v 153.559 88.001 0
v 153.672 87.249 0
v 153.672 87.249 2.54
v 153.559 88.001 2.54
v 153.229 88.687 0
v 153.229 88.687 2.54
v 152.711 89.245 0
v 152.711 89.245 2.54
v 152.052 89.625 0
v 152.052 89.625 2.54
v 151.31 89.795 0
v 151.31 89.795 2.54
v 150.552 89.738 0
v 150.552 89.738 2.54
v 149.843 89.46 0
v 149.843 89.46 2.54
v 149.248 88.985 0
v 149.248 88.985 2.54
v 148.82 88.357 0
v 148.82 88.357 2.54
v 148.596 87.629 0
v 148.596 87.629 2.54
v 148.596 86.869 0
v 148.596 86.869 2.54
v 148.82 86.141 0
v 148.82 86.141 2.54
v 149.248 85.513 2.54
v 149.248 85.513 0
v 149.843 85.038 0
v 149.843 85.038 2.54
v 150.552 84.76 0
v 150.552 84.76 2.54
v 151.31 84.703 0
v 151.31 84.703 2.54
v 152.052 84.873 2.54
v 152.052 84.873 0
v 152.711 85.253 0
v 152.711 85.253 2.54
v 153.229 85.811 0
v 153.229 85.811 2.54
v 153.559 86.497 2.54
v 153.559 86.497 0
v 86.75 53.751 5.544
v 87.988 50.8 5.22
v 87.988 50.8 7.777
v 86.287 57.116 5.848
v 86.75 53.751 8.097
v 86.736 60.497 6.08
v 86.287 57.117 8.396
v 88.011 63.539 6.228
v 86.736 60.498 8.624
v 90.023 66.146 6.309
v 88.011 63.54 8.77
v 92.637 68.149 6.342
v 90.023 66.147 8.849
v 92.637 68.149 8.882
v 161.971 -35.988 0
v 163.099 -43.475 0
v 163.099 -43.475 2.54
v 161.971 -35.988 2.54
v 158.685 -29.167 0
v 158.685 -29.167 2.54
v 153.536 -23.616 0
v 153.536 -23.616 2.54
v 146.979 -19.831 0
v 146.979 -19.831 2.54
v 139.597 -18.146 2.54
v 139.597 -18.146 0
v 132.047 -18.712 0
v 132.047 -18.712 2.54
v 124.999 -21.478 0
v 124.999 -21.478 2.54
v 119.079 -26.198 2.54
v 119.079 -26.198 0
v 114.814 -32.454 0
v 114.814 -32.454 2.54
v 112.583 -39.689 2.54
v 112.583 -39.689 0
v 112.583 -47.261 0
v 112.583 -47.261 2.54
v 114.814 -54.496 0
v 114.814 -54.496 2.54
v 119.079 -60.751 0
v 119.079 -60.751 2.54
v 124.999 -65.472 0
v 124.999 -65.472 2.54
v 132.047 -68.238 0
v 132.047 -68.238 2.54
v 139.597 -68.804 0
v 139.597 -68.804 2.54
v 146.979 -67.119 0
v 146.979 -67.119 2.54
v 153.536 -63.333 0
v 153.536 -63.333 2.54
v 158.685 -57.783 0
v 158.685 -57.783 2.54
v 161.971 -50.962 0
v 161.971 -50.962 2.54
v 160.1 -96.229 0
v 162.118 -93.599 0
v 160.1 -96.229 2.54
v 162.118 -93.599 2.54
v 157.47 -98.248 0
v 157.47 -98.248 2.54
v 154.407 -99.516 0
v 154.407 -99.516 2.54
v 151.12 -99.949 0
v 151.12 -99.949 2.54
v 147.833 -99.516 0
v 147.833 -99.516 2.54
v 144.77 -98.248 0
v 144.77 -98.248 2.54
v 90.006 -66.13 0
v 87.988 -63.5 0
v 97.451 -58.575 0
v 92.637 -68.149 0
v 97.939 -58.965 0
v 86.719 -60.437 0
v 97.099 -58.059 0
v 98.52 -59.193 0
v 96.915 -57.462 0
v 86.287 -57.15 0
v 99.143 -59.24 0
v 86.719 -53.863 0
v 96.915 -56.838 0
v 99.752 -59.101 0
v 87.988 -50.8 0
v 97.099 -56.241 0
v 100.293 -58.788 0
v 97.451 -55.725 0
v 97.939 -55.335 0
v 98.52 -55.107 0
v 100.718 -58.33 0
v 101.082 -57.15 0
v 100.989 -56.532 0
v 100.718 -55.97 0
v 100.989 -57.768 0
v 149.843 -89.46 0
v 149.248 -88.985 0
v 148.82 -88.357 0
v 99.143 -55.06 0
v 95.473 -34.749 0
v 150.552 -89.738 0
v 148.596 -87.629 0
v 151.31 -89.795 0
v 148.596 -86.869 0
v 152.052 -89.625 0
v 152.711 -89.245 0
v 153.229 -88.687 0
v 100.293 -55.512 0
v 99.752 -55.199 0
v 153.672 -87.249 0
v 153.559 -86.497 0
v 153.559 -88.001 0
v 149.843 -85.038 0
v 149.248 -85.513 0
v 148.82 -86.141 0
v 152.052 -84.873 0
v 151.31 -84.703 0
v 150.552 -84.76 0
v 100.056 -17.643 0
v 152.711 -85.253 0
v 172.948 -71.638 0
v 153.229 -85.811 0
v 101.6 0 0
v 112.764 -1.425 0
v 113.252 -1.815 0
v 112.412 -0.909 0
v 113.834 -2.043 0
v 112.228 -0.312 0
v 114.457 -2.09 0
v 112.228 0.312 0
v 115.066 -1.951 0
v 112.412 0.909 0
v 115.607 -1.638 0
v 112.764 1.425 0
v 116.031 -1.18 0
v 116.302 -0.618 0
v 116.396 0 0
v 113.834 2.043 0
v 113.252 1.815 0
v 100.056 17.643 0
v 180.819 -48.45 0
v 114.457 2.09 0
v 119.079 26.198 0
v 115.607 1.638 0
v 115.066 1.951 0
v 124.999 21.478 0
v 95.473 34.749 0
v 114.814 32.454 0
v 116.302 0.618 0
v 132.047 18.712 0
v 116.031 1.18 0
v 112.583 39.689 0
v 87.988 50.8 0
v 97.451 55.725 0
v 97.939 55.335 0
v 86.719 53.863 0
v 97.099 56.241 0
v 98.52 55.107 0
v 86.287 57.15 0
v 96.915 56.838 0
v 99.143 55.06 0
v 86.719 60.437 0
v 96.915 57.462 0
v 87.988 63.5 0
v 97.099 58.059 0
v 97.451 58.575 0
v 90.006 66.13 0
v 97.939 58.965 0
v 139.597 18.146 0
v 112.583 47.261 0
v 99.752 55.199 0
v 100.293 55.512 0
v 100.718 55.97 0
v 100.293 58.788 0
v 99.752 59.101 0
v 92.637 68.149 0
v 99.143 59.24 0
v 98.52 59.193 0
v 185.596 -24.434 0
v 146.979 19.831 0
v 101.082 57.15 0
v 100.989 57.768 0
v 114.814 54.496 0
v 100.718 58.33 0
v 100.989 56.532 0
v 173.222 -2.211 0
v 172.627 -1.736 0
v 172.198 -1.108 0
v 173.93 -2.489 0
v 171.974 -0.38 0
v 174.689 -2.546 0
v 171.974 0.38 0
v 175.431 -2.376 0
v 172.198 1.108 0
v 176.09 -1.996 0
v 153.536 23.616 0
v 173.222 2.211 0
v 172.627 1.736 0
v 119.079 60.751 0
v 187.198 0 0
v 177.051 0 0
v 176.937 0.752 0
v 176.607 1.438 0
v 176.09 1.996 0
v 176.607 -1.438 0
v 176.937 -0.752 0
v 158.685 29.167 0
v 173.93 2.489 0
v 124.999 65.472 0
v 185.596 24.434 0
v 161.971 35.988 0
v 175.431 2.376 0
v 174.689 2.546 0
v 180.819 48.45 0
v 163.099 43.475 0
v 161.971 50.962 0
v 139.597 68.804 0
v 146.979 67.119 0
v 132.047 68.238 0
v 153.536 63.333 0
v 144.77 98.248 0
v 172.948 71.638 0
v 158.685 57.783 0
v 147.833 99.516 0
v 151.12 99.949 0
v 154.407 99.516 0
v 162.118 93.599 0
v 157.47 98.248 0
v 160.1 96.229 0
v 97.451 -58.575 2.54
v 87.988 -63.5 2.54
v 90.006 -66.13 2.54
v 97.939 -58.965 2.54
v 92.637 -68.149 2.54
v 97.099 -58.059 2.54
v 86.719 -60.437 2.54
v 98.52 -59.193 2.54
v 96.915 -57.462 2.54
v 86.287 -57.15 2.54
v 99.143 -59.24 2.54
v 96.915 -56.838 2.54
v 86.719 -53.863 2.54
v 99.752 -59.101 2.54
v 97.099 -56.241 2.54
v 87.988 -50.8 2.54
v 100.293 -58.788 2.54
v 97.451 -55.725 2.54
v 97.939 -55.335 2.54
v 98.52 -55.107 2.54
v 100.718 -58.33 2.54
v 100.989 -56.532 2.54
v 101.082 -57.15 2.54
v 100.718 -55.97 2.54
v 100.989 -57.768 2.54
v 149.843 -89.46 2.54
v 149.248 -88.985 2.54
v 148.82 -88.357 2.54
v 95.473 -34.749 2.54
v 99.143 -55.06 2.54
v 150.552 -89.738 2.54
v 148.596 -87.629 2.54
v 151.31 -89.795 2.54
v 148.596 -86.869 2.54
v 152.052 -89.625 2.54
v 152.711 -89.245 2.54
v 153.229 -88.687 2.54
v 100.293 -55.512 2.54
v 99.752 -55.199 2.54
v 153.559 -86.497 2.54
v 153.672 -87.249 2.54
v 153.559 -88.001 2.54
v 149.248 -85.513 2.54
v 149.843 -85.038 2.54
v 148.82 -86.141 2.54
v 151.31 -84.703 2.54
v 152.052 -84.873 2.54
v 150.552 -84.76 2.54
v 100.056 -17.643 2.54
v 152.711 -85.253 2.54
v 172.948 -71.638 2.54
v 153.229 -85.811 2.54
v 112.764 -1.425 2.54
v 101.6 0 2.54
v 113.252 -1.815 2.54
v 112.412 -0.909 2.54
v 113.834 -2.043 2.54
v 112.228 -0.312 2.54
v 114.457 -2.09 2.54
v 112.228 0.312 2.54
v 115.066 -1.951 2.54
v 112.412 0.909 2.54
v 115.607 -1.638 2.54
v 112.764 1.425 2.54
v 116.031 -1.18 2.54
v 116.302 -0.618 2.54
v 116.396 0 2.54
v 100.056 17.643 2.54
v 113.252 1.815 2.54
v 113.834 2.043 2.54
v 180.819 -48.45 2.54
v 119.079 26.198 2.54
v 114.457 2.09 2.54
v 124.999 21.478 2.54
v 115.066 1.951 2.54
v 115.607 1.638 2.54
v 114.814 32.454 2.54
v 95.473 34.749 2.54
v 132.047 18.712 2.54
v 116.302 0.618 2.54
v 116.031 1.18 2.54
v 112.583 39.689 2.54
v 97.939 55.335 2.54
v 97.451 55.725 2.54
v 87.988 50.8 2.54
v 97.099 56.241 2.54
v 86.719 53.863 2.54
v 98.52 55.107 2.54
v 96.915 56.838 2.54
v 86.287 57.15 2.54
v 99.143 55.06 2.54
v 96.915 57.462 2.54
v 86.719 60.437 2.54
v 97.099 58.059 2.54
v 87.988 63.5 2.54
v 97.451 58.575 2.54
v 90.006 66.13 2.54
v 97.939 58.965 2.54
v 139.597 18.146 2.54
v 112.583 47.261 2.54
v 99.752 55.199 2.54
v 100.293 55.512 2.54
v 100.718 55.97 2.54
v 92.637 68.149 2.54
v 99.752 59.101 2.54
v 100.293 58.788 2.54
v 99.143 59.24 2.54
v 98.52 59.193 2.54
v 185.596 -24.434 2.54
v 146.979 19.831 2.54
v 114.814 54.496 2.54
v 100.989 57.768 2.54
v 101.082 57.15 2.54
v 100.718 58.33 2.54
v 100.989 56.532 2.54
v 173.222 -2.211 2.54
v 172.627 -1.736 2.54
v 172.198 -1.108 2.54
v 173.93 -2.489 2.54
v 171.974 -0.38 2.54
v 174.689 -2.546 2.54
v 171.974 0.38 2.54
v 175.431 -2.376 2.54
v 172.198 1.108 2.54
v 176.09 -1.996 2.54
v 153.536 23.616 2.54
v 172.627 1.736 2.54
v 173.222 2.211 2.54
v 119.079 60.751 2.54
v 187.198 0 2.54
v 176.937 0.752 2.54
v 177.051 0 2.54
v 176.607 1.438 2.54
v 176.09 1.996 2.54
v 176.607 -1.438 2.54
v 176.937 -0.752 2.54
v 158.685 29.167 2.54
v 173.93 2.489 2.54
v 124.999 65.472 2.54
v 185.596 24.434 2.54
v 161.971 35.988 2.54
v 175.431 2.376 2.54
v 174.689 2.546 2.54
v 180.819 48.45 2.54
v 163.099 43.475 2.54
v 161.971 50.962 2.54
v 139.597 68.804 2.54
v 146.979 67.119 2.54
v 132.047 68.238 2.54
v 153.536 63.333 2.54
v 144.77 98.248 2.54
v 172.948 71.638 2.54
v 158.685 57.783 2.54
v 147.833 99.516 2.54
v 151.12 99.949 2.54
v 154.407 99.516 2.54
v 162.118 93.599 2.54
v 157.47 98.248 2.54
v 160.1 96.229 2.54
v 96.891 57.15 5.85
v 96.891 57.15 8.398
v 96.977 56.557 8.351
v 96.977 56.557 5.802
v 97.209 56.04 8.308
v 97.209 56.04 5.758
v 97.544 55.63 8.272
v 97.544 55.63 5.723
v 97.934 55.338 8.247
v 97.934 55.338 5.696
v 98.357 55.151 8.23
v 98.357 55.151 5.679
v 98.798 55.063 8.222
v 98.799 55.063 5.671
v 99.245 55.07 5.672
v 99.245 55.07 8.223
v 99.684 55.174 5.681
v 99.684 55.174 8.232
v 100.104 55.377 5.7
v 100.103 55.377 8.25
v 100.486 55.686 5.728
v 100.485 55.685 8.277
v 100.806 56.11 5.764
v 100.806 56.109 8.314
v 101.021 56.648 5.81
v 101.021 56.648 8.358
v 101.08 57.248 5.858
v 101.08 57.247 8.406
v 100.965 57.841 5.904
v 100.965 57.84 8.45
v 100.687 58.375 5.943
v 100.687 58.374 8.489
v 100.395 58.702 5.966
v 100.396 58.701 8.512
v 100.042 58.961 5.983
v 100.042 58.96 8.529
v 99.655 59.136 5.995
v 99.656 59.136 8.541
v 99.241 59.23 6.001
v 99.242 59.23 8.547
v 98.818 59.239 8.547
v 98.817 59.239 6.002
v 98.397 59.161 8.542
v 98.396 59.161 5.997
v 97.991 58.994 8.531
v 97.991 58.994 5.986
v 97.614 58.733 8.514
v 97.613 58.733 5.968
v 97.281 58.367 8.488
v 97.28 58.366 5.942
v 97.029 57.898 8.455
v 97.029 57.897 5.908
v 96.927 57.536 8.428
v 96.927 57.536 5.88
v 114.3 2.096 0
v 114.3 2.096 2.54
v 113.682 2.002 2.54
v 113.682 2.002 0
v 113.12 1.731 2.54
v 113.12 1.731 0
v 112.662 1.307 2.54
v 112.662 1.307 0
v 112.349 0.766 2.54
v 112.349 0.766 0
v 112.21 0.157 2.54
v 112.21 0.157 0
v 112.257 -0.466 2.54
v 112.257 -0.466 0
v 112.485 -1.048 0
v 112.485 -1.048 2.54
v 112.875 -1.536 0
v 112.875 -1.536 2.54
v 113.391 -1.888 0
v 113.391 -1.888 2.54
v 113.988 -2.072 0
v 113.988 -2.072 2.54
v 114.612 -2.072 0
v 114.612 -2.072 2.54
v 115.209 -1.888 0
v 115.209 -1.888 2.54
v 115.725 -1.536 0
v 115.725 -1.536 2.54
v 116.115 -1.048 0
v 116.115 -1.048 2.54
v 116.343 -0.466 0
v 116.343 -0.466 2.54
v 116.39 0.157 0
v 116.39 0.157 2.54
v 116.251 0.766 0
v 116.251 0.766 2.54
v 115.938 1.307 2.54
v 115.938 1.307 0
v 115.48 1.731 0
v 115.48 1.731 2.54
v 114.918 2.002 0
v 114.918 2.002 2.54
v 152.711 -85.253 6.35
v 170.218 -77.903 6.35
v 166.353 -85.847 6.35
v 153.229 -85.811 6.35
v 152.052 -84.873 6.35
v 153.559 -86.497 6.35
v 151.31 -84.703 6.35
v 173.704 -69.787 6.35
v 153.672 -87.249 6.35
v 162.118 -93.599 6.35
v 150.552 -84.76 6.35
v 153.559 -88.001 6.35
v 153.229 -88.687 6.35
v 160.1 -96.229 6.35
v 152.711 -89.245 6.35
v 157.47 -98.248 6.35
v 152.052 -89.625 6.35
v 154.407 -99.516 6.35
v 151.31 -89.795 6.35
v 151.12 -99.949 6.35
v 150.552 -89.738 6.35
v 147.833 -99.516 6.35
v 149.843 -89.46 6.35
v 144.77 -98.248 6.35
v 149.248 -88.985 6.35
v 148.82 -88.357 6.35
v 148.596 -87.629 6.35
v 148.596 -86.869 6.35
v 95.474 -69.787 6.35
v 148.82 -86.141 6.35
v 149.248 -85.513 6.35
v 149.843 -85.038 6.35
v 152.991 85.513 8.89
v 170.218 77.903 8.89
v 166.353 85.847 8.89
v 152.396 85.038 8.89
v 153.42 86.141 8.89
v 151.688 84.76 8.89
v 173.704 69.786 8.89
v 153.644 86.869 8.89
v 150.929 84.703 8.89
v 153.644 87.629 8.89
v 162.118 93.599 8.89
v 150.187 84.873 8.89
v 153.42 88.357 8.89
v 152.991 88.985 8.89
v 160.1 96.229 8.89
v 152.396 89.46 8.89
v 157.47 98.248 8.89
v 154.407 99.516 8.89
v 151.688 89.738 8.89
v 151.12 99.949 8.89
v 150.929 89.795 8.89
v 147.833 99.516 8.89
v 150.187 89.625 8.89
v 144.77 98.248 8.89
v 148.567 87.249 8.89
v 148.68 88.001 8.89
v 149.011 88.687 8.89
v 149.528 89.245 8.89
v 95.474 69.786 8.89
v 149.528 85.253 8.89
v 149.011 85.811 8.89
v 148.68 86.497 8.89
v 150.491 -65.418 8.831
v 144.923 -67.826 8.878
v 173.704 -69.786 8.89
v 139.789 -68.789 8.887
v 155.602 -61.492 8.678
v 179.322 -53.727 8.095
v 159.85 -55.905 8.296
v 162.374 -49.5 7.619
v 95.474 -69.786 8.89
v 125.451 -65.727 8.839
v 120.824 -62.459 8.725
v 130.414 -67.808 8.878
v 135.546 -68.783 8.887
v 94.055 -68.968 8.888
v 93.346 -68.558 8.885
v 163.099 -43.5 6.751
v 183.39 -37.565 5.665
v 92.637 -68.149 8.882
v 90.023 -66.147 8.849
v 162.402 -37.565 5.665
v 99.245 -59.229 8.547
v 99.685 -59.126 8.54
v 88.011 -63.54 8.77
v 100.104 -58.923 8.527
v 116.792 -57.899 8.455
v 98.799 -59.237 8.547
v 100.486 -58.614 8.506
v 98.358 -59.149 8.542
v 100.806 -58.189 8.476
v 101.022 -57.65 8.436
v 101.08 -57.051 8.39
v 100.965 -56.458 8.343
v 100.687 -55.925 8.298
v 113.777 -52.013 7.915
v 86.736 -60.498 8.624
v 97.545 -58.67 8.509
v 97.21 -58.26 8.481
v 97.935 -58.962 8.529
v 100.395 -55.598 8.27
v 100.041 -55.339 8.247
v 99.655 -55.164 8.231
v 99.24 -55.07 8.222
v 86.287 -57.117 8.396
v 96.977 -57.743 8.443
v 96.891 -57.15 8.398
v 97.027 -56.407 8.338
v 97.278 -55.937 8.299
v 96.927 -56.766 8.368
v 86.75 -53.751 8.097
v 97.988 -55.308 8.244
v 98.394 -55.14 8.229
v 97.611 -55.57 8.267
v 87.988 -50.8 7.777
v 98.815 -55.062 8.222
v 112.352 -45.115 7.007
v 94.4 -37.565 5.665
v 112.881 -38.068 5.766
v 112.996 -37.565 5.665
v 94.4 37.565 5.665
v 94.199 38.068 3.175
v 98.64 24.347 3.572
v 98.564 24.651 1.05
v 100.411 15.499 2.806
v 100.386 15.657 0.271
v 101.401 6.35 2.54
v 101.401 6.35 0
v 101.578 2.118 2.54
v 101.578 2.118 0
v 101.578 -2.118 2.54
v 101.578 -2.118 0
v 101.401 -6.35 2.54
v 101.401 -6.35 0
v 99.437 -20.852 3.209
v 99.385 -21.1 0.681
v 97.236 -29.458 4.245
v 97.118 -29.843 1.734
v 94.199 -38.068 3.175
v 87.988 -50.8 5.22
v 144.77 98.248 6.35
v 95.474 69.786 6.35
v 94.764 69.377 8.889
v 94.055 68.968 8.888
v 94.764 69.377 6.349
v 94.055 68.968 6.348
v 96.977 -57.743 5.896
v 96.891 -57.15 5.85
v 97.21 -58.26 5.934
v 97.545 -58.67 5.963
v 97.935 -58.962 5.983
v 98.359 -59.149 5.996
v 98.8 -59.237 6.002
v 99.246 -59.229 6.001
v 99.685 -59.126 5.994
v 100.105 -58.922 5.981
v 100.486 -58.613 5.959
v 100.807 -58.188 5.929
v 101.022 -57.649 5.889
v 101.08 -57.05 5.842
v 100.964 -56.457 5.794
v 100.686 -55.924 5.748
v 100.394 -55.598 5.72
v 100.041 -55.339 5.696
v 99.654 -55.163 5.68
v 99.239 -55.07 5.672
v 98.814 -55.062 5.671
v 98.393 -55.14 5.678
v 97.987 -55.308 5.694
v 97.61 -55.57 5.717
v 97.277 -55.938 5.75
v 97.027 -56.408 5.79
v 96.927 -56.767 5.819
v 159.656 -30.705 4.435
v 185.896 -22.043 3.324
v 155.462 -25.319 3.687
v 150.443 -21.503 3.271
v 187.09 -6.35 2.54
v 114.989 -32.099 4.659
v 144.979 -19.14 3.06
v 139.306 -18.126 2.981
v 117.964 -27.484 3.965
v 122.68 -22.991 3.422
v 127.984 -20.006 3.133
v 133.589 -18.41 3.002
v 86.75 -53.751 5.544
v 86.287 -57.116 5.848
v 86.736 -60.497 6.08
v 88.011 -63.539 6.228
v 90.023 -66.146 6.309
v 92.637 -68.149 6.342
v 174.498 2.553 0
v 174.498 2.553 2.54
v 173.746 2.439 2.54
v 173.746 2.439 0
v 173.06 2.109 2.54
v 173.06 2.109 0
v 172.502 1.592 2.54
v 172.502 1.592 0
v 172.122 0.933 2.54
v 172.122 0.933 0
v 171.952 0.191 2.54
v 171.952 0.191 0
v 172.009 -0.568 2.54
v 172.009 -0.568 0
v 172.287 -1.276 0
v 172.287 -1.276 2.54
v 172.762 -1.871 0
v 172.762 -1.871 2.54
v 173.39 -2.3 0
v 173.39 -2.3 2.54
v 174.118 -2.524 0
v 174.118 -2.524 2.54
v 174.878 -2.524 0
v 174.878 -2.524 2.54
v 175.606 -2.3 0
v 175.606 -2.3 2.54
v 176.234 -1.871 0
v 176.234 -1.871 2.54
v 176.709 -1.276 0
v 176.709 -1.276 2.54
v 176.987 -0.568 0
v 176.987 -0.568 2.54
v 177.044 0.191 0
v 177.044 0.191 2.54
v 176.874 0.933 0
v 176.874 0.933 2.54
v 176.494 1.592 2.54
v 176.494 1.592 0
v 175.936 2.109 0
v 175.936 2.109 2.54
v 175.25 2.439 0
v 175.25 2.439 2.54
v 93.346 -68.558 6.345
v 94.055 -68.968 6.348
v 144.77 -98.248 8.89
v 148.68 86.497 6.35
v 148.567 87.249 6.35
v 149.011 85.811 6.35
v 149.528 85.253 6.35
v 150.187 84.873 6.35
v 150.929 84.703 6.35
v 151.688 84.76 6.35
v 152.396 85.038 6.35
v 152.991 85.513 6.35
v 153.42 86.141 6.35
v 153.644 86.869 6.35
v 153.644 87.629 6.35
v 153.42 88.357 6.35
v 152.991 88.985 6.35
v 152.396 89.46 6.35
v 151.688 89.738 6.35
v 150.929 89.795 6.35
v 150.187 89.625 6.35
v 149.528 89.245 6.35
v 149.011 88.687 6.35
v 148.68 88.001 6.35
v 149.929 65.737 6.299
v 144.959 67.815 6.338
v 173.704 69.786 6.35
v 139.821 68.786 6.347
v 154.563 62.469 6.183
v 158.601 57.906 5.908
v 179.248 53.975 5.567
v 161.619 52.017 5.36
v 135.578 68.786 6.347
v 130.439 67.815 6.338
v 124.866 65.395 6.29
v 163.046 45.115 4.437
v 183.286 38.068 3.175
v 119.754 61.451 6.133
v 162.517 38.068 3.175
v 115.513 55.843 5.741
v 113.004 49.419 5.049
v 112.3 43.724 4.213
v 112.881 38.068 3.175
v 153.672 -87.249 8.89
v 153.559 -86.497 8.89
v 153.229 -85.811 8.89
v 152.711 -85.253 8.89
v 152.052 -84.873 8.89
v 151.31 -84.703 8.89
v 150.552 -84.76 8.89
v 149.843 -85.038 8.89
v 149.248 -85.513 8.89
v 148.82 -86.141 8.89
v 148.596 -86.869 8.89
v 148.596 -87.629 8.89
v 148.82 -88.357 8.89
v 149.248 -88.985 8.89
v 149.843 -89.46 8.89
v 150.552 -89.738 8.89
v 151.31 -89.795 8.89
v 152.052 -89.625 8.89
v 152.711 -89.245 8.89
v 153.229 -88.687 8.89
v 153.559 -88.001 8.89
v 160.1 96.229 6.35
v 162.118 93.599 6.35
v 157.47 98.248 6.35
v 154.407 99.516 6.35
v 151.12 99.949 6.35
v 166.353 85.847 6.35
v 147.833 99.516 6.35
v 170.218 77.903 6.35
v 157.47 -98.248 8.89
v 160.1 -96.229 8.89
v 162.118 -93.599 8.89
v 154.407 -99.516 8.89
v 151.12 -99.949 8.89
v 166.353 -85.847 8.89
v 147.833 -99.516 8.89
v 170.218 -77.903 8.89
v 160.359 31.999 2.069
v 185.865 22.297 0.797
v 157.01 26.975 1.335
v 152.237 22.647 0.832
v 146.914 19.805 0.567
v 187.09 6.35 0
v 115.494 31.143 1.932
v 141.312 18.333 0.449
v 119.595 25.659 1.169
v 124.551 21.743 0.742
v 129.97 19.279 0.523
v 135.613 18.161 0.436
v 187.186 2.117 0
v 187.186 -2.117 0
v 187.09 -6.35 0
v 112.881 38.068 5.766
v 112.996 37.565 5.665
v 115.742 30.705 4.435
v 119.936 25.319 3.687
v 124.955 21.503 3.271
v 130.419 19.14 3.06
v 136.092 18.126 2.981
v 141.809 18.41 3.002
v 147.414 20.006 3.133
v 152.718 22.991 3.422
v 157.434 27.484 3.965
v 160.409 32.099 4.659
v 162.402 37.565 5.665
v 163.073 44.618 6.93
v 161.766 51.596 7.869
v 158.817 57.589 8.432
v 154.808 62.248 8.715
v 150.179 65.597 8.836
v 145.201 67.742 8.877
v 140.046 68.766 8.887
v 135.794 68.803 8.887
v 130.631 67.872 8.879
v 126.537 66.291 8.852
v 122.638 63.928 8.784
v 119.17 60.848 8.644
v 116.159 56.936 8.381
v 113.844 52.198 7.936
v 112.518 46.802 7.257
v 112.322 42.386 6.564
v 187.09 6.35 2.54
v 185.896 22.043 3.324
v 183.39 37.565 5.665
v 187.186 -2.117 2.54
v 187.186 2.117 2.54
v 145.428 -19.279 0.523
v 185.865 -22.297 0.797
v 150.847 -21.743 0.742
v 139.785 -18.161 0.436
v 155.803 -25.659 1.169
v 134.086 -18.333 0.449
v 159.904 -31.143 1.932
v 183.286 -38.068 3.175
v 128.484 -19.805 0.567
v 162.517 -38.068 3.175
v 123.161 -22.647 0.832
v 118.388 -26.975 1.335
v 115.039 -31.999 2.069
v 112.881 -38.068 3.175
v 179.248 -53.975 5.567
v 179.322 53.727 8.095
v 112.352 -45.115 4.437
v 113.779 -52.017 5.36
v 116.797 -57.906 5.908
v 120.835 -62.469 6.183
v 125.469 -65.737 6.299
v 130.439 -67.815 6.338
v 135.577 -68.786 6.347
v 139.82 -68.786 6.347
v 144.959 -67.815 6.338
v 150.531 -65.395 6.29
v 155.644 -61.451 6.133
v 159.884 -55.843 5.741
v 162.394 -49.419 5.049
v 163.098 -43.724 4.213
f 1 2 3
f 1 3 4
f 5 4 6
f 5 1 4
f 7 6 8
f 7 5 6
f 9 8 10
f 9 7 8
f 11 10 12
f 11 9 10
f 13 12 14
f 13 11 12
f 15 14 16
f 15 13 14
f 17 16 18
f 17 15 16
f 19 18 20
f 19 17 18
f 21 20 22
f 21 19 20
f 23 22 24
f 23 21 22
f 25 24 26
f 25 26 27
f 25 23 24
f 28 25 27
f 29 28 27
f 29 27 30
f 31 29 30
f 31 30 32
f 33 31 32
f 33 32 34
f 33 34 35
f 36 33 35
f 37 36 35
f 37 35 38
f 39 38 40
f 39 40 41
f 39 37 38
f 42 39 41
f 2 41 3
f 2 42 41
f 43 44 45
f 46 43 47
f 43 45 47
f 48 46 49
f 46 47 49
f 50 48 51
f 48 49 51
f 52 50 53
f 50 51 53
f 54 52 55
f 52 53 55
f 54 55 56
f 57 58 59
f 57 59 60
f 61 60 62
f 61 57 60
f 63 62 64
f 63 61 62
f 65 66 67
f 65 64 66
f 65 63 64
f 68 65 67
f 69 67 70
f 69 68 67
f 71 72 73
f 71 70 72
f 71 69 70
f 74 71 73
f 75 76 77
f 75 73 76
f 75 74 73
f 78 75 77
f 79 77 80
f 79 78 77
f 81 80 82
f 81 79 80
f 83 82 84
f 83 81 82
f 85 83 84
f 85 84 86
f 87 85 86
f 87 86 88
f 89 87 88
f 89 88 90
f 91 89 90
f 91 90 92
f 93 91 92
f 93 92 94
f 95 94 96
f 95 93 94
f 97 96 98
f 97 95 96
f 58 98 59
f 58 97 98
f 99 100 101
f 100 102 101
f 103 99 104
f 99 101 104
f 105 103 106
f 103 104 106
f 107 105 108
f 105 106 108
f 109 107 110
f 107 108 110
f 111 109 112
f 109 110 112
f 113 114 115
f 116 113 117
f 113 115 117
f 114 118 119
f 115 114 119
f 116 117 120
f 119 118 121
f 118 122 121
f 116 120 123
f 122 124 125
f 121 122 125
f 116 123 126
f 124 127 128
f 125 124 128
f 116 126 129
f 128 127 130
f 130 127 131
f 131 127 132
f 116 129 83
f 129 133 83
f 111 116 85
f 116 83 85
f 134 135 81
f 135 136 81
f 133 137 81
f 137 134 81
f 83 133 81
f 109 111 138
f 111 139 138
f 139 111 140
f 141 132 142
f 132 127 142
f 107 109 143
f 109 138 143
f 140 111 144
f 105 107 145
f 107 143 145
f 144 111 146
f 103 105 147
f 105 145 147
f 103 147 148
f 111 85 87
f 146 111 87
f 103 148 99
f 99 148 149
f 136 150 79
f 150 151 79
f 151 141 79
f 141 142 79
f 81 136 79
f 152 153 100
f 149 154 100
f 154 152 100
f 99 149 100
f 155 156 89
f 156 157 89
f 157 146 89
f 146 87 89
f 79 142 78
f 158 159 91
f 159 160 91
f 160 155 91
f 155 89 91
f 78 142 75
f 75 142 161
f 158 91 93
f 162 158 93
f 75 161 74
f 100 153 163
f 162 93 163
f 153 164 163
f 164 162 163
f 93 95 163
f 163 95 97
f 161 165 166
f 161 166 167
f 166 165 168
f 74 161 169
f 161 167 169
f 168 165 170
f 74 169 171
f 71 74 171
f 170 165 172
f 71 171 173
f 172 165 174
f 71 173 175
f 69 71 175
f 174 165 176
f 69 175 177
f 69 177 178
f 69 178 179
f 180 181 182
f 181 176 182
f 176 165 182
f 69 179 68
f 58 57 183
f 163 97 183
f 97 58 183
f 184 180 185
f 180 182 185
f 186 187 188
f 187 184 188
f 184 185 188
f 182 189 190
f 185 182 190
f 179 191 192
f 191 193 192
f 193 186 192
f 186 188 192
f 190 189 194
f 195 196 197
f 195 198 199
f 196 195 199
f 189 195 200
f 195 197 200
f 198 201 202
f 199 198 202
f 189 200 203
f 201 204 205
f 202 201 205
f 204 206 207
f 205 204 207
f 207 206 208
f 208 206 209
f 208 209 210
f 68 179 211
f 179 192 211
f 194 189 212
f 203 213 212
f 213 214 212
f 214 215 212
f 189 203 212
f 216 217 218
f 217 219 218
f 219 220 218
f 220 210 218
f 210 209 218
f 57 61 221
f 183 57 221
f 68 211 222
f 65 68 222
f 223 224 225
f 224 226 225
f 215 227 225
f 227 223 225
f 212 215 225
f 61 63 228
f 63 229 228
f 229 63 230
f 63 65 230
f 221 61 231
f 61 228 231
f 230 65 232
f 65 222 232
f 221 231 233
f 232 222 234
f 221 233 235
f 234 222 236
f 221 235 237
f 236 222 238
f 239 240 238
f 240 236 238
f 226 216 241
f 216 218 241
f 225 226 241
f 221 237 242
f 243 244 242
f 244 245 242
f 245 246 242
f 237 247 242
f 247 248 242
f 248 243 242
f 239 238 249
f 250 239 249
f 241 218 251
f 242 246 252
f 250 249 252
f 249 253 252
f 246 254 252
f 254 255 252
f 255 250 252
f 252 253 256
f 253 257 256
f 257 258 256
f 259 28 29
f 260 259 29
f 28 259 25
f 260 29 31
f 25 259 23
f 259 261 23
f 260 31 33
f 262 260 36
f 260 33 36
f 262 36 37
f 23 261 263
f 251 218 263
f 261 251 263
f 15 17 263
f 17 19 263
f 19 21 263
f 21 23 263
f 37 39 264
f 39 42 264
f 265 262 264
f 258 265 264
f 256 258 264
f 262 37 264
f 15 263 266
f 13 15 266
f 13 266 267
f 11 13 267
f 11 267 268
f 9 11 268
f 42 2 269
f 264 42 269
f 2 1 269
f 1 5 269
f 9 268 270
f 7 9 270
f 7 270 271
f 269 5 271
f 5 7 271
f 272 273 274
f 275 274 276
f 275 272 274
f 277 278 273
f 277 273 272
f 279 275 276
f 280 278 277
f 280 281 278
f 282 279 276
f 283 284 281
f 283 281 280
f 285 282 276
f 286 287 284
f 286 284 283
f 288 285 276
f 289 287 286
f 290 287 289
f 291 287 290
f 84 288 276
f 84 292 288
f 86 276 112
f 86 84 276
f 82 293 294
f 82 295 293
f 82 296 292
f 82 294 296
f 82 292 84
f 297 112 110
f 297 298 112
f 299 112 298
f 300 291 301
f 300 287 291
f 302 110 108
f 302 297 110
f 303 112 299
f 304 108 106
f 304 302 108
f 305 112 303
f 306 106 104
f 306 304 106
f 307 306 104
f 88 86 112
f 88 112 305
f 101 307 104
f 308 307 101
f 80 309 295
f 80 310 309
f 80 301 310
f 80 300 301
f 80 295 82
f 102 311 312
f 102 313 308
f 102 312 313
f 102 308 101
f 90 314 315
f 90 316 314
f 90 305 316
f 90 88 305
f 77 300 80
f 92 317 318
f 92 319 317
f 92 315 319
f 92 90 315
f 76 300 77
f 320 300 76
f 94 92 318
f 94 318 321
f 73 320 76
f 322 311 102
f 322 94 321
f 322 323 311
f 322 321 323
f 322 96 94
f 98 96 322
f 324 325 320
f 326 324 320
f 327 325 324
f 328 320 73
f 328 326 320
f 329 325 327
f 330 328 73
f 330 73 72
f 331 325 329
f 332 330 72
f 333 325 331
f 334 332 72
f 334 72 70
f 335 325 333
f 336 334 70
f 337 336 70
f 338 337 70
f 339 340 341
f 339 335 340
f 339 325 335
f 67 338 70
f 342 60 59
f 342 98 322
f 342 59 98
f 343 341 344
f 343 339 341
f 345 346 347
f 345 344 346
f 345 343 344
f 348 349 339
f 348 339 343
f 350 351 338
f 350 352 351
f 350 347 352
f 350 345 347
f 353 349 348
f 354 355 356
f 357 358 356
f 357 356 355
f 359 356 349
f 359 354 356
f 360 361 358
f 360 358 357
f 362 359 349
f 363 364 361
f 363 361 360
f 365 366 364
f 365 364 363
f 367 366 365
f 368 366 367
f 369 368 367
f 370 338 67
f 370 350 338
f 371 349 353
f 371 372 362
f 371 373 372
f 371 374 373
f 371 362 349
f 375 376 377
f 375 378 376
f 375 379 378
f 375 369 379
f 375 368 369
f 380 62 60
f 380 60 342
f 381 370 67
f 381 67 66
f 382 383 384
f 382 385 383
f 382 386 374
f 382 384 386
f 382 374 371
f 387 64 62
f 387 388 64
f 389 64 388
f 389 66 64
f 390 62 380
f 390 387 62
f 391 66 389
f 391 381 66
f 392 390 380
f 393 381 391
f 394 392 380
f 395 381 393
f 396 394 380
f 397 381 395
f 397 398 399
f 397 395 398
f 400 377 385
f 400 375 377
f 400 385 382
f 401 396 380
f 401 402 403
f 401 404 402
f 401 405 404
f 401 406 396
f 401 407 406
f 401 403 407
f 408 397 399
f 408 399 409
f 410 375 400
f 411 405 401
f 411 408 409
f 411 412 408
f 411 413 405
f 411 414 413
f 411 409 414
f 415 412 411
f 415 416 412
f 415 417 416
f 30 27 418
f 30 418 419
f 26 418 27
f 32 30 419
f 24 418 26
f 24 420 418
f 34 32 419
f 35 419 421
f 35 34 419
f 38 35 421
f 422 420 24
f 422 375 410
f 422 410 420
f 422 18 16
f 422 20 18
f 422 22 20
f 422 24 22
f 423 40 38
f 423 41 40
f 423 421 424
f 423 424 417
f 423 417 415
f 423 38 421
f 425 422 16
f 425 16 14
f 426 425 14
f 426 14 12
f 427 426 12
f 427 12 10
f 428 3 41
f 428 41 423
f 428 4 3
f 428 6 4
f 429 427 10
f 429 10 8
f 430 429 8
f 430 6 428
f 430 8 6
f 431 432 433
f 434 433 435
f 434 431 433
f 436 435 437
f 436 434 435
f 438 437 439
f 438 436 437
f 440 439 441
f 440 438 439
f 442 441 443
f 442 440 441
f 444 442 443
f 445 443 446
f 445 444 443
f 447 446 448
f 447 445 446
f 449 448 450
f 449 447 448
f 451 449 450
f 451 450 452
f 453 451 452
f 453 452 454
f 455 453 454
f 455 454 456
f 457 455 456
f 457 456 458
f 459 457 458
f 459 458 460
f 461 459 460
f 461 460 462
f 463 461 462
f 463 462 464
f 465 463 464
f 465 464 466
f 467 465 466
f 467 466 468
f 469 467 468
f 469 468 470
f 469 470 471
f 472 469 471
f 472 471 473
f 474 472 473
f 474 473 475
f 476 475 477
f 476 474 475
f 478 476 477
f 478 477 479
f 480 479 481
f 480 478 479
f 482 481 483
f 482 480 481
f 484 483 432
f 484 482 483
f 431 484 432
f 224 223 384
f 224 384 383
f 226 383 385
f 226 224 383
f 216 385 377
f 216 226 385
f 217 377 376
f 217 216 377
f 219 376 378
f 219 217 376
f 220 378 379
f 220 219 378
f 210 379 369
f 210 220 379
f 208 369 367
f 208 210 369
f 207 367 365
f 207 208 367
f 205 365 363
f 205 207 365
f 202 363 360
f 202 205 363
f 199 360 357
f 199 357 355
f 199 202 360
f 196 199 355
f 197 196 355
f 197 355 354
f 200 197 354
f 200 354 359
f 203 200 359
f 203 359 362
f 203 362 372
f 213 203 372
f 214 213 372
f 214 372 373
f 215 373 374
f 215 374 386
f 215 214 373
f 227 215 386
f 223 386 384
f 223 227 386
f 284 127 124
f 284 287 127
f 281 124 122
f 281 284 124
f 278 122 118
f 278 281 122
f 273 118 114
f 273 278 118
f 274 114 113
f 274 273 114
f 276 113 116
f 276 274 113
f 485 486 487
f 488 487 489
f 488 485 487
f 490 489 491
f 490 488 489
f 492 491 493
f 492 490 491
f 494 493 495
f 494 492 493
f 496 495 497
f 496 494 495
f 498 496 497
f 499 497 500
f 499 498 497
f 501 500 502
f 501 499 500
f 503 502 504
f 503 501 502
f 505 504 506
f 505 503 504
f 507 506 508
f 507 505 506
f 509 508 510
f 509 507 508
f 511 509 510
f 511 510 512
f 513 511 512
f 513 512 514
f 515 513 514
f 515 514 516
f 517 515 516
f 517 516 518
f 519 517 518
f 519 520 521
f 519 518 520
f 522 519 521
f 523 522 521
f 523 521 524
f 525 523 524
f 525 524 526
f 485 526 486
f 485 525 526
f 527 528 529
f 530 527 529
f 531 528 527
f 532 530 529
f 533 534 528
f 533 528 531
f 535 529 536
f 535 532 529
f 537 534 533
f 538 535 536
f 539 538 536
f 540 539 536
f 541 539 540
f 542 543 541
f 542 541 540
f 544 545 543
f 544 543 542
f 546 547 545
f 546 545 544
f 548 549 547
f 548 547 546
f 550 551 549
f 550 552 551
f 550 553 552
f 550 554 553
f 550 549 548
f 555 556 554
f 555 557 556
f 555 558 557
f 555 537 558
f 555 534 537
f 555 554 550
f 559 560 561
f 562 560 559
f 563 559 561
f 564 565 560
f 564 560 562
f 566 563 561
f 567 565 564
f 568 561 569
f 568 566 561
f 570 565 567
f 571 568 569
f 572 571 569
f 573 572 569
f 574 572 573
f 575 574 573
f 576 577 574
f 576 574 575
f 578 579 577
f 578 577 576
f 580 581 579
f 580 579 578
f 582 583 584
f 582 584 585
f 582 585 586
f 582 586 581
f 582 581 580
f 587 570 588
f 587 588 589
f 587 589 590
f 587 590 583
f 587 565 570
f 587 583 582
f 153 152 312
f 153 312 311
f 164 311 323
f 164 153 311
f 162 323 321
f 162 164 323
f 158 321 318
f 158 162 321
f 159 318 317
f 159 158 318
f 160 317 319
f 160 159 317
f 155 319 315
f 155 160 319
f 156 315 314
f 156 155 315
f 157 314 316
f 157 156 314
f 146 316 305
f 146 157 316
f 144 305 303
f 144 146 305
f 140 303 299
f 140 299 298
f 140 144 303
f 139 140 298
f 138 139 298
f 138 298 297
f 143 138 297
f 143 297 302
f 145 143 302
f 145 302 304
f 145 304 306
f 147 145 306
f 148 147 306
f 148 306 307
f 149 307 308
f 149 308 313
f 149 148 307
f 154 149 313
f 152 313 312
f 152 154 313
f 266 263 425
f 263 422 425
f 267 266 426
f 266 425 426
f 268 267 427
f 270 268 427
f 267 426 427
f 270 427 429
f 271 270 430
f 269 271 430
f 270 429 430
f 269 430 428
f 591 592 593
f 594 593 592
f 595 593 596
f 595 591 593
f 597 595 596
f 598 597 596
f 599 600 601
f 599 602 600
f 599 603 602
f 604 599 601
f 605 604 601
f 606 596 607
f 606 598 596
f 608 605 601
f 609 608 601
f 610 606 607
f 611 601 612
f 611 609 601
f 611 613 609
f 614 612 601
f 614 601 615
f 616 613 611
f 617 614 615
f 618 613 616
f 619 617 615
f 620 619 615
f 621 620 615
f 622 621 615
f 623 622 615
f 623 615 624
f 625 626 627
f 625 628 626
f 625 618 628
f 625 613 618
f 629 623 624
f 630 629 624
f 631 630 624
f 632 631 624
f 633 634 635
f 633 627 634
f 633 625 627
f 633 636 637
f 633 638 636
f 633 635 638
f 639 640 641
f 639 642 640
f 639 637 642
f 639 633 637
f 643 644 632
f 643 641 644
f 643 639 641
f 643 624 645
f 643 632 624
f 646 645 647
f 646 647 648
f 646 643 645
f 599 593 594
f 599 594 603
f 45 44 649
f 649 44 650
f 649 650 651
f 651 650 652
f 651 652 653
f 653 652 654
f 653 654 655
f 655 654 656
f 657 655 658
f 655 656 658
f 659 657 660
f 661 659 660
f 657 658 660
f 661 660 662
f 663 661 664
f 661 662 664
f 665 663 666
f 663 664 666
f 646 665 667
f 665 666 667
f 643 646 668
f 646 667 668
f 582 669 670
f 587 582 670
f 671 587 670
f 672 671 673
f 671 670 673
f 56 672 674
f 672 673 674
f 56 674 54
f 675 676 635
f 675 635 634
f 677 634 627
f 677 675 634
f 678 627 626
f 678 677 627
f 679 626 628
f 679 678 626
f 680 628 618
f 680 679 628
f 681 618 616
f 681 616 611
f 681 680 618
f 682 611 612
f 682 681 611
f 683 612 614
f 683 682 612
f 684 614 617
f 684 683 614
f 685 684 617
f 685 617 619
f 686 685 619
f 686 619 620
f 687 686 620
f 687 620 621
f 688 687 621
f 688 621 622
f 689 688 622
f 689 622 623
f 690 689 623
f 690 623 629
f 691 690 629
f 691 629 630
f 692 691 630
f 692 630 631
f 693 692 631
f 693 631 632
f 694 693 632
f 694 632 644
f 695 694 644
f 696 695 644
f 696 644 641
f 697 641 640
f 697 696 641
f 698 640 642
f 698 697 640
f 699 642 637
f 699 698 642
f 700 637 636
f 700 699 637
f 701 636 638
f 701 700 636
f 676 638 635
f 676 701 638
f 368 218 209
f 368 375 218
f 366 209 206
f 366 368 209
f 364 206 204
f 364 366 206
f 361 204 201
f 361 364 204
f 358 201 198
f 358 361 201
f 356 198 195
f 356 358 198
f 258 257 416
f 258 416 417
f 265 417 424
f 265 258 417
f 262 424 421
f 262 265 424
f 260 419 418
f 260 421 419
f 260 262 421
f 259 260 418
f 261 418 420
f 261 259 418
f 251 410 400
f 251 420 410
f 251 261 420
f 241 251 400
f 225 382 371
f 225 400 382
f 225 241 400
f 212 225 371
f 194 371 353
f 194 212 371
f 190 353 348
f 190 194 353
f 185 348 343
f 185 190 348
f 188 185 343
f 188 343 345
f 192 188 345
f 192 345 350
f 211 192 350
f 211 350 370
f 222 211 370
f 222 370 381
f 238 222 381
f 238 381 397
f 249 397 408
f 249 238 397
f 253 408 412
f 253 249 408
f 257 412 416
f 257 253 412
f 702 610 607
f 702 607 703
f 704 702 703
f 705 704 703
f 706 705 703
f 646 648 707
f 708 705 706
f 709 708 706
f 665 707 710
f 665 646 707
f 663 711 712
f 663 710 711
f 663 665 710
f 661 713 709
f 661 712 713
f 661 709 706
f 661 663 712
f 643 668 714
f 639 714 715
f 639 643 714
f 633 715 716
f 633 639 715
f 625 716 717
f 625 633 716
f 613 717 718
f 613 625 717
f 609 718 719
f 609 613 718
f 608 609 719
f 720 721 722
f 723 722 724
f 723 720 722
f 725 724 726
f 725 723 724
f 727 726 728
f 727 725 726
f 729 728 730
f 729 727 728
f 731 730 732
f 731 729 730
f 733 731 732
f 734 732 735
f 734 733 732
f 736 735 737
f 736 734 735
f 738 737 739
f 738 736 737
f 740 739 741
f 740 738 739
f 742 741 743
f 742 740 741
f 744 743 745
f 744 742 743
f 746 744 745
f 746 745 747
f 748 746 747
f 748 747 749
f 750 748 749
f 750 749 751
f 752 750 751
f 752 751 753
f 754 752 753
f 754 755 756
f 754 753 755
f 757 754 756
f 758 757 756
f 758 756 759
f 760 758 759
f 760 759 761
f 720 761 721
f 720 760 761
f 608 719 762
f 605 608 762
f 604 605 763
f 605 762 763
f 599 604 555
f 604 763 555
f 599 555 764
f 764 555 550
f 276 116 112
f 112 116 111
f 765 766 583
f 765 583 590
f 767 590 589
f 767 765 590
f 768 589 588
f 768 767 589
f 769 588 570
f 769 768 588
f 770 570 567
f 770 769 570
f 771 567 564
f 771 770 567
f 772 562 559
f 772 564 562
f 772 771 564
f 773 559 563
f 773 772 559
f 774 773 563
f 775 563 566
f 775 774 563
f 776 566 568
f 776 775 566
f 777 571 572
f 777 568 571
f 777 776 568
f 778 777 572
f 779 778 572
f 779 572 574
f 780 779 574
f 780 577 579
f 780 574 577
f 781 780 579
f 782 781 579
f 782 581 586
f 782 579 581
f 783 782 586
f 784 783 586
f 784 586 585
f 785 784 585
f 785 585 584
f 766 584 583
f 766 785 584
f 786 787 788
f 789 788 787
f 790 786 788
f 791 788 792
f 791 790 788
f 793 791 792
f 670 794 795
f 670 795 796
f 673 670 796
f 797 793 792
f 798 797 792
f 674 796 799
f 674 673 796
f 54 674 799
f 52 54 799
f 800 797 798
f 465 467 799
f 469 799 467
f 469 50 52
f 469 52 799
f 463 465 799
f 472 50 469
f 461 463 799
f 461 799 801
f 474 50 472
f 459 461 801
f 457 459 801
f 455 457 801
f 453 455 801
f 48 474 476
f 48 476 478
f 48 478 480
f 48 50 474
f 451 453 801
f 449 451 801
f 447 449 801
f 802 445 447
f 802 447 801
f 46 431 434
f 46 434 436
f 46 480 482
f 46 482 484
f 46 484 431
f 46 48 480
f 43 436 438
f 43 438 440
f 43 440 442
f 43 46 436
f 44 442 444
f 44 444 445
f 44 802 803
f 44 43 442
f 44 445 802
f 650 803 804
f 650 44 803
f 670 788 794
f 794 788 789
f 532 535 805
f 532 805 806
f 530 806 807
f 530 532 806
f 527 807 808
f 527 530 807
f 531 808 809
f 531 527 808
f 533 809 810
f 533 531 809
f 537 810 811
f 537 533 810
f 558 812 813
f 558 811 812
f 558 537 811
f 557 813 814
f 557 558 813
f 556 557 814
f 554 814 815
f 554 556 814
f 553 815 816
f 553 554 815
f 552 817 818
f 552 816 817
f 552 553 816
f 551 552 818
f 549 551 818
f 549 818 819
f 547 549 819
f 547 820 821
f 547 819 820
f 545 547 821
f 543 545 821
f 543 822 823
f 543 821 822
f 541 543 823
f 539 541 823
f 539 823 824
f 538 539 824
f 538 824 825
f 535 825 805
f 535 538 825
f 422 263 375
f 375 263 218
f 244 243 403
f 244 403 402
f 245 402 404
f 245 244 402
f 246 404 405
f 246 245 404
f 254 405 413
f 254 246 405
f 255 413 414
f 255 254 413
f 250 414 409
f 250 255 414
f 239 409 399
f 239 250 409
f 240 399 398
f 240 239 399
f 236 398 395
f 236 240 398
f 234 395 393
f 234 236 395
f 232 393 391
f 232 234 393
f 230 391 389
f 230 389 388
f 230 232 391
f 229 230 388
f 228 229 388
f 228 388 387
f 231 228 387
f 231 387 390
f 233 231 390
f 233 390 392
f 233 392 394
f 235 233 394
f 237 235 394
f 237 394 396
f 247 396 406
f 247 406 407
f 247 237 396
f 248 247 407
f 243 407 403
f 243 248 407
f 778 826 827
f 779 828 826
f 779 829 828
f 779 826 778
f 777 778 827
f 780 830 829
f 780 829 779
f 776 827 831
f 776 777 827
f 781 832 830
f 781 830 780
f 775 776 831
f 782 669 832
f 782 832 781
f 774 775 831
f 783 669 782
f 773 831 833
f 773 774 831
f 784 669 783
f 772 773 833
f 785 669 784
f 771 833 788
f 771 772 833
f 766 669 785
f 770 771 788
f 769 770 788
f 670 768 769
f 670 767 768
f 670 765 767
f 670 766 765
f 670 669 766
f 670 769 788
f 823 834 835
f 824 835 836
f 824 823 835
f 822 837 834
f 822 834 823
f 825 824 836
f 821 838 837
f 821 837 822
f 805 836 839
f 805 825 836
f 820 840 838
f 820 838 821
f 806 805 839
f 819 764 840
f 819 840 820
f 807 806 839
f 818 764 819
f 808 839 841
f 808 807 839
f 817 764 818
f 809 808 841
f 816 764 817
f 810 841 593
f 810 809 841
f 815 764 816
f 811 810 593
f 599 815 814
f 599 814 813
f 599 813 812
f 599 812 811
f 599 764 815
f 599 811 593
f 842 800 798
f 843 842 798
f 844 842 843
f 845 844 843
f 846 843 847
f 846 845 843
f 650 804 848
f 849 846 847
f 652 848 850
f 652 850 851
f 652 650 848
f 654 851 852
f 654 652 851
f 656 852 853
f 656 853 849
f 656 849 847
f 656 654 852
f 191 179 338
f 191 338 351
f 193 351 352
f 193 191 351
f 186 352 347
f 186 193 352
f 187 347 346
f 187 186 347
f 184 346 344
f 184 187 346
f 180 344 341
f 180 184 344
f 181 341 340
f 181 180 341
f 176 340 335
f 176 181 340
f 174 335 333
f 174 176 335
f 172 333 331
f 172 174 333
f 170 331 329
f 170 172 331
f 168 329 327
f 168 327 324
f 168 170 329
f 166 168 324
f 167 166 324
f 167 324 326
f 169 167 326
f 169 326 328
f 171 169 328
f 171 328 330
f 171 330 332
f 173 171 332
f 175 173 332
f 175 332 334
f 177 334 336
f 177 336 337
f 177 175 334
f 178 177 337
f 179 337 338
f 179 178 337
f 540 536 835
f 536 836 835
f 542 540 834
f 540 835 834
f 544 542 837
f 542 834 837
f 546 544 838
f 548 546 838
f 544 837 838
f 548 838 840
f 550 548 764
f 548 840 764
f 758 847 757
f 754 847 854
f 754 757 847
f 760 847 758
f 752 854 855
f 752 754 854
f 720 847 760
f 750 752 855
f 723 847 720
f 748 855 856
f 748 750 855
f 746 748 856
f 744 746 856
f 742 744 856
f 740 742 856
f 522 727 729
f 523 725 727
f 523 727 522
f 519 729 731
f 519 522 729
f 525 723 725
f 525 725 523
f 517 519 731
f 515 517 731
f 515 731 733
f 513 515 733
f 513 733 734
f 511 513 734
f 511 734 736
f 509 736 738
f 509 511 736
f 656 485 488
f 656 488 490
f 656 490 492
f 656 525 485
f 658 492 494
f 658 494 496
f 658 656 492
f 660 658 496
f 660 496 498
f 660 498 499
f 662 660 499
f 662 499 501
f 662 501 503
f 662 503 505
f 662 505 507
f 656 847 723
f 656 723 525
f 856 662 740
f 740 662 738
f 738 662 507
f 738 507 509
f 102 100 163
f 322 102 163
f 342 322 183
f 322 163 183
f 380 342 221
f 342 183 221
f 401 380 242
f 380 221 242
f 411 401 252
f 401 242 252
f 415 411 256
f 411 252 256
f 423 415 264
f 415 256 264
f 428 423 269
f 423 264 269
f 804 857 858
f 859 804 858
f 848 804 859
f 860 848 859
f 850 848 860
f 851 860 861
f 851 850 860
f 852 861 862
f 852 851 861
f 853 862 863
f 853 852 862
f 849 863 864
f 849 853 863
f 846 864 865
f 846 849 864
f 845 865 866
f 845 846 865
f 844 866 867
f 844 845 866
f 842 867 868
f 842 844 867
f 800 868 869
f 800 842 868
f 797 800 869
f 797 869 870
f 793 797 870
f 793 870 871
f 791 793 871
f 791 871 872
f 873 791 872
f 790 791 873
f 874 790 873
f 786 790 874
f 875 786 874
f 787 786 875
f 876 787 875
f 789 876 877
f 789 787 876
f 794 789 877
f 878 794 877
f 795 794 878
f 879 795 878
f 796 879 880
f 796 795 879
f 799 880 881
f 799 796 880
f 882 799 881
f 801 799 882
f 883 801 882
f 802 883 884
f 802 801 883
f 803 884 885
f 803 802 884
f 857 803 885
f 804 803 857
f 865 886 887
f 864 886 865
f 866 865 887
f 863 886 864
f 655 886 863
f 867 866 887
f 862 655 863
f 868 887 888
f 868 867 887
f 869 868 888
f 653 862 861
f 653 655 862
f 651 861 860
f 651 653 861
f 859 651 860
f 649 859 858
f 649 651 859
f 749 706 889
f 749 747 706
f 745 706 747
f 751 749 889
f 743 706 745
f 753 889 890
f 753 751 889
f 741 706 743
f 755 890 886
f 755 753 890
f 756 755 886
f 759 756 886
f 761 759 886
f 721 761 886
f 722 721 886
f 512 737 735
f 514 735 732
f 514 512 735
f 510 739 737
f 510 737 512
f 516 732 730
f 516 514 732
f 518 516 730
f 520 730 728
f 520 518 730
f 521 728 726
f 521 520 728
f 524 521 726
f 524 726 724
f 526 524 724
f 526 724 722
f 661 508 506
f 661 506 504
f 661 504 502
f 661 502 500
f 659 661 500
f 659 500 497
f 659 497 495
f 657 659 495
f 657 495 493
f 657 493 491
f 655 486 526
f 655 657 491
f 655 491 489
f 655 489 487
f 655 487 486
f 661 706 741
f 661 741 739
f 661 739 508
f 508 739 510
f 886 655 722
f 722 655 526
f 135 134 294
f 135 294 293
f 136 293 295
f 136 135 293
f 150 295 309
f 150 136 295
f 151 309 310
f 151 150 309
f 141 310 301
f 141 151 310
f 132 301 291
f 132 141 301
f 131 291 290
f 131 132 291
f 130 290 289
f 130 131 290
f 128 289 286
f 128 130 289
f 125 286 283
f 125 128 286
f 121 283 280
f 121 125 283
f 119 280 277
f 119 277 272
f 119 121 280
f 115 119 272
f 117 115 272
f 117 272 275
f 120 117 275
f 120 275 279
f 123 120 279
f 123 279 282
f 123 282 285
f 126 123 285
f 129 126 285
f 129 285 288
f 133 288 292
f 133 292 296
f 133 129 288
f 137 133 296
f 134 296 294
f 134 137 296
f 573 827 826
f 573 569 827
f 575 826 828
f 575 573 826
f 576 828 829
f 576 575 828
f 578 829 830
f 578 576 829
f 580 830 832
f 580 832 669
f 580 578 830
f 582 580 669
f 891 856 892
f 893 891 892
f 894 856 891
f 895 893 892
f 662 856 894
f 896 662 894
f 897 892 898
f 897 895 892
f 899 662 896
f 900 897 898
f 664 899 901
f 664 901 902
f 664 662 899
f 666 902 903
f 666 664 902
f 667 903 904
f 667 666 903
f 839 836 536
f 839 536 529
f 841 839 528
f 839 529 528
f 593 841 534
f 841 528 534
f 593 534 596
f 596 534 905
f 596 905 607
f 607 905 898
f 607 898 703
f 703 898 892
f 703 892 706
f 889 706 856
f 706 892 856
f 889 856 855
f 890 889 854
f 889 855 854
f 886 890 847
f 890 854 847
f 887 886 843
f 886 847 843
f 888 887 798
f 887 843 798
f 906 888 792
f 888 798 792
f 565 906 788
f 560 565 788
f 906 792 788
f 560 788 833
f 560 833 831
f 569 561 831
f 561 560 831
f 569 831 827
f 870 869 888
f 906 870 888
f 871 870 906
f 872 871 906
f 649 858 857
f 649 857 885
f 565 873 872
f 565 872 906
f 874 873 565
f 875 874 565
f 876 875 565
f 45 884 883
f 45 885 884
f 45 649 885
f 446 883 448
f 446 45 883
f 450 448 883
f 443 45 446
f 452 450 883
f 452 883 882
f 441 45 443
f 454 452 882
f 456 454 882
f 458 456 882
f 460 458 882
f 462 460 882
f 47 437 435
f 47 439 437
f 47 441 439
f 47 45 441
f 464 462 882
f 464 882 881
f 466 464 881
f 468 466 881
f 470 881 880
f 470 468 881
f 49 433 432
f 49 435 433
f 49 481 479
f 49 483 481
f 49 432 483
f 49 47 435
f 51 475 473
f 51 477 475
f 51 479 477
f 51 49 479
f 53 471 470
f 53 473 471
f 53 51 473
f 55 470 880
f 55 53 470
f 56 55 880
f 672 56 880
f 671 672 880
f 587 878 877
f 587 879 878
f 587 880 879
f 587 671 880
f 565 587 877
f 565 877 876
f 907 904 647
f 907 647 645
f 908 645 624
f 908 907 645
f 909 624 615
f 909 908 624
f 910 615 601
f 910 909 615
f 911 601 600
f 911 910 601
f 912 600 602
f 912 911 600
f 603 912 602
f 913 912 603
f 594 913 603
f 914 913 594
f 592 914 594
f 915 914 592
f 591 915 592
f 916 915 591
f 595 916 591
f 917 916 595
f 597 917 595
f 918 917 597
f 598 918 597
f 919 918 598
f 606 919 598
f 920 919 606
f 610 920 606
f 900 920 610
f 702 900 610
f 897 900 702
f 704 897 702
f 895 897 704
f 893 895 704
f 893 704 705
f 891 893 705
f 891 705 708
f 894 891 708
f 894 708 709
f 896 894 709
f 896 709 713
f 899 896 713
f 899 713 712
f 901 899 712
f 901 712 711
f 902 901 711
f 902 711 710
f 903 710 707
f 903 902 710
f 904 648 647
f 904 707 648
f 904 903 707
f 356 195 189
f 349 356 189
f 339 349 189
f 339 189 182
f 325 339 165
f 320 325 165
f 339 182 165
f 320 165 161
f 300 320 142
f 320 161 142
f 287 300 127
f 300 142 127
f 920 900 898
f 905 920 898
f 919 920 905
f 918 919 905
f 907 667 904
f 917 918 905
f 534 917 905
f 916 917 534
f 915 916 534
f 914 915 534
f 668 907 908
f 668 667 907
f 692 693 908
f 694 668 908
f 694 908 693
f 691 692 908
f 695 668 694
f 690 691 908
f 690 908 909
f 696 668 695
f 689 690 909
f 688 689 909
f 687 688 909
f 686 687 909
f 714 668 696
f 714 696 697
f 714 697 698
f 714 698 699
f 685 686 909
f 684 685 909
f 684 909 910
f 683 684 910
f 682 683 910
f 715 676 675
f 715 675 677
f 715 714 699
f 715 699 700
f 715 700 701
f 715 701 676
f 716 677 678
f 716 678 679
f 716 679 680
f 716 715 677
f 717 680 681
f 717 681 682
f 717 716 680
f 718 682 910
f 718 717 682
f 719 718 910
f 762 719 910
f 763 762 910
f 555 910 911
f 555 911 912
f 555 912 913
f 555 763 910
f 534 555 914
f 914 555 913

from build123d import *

# Parameters (mm, degrees)
SKETCH1_R               = 2.5527
SKETCH1_R_2             = 2.0955
BOSS_EXTRUDE1_DEPTH     = 2.54
CUT_EXTRUDE1_DEPTH      = 215.348124344
CUT_EXTRUDE1_DEPTH_BACK = 215.348124344
SKETCH2_R               = 25.4
BOSS_EXTRUDE2_DEPTH     = 276.098
SKETCH1_2_OUTSIDE_W     = 347.428
SKETCH1_2_OUTSIDE_H     = 280.754
SKETCH1_2_OUTSIDE_R     = 2.5527
SKETCH1_2_OUTSIDE_R_2   = 2.0955
CUT_EXTRUDE3_DEPTH      = 276.098
FILLET1_R               = 12.7
FILLET2_R               = 12.7
CUT_EXTRUDE4_DEPTH      = 213.304536795
CUT_EXTRUDE4_DEPTH_BACK = 213.304536795
SKETCH2_2_R             = 25.4


with BuildPart() as part:
    # Sketch1 → Boss-Extrude1 (new body)
    with BuildSketch(Plane.XY):
        with BuildLine():
            Line((155.394709042, 104.381873933), (80.948066989, 61.400085104))
            ThreePointArc((80.948066989, 61.400085104), (101.6, 0), (80.948066989, -61.400085104))
            Line((80.948066989, -61.400085104), (155.394709042, -104.381873933))
            ThreePointArc((155.394709042, -104.381873933), (187.198, 0), (155.394709042, 104.381873933))
        make_face()
        with Locations((174.498, 0)):
            Circle(SKETCH1_R, mode=Mode.SUBTRACT)
        with Locations((151.11970091, 87.249)):
            Circle(SKETCH1_R, mode=Mode.SUBTRACT)
        with Locations((151.11970091, -87.249)):
            Circle(SKETCH1_R, mode=Mode.SUBTRACT)
        with Locations((98.986703653, 57.15)):
            Circle(SKETCH1_R_2, mode=Mode.SUBTRACT)
        with Locations((114.3, 0)):
            Circle(SKETCH1_R_2, mode=Mode.SUBTRACT)
        with Locations((98.986703653, -57.15)):
            Circle(SKETCH1_R_2, mode=Mode.SUBTRACT)
    extrude(amount=BOSS_EXTRUDE1_DEPTH)

    # Sketch2 → Cut-Extrude1 (cut, two sides: drawn at the far end of the back side and taken through both)
    with BuildSketch(Plane.XY.offset(2.54).offset(-CUT_EXTRUDE1_DEPTH_BACK)):
        with Locations((137.698969318, 43.474878375)):
            Circle(SKETCH2_R)
        with Locations((137.698969318, -43.474878375)):
            Circle(SKETCH2_R)
    extrude(amount=CUT_EXTRUDE1_DEPTH + CUT_EXTRUDE1_DEPTH_BACK, mode=Mode.SUBTRACT)

    # Fillet1
    fillet1_edges = [part.edges().sort_by_distance(p)[0] for p in [
        (155.394709042, 104.381873933, 1.27),
        (80.948066989, 61.400085104, 1.27),
        (155.394709042, -104.381873933, 1.27),
        (80.948066989, -61.400085104, 1.27),
    ]]
    fillet(fillet1_edges, radius=FILLET1_R)


with BuildPart() as body_2:
    # Sketch3 → Boss-Extrude2 (new body)
    with BuildSketch(Plane(origin=(0, 0, 0), x_dir=(0, 0, -1), z_dir=(1, 0, 0))):
        with BuildLine():
            Line((0, 6.35), (0, -6.35))
            ThreePointArc((0, -6.35), (-0.79572845, -22.288381411), (-3.175, -38.06825))
            ThreePointArc((-3.175, -38.06825), (-5.55427155, -53.848118589), (-6.35, -69.7865))
            Line((-6.35, -69.7865), (-6.35, -104.7115))
            Line((-6.35, -104.7115), (-8.89, -104.7115))
            Line((-8.89, -104.7115), (-8.89, -69.7865))
            ThreePointArc((-8.89, -69.7865), (-8.081640952, -53.595128658), (-5.664603225, -37.564786214))
            ThreePointArc((-5.664603225, -37.564786214), (-3.323097852, -22.035391481), (-2.54, -6.35))
            Line((-2.54, -6.35), (-2.54, 6.35))
            ThreePointArc((-2.54, 6.35), (-3.323097852, 22.035391481), (-5.664603225, 37.564786214))
            ThreePointArc((-5.664603225, 37.564786214), (-8.081640952, 53.595128658), (-8.89, 69.7865))
            Line((-8.89, 69.7865), (-8.89, 104.7115))
            Line((-8.89, 104.7115), (-6.35, 104.7115))
            Line((-6.35, 104.7115), (-6.35, 69.7865))
            ThreePointArc((-6.35, 69.7865), (-5.55427155, 53.848118589), (-3.175, 38.06825))
            ThreePointArc((-3.175, 38.06825), (-0.79572845, 22.288381411), (0, 6.35))
        make_face()
    extrude(amount=BOSS_EXTRUDE2_DEPTH)

    # Sketch1<2> outside → Cut-Extrude3 (cut)
    # profile 1 of 7: a face of its own
    with BuildSketch(Plane.XY):
        with Locations((138.049, 0)):
            Rectangle(SKETCH1_2_OUTSIDE_W, SKETCH1_2_OUTSIDE_H)
        with BuildLine():
            Line((155.394709042, 104.381873933), (80.948066989, 61.400085104))
            ThreePointArc((80.948066989, 61.400085104), (101.6, 0), (80.948066989, -61.400085104))
            Line((80.948066989, -61.400085104), (155.394709042, -104.381873933))
            ThreePointArc((155.394709042, -104.381873933), (187.198, 0), (155.394709042, 104.381873933))
        make_face(mode=Mode.SUBTRACT)
    # profile 2 of 7: a face of its own
    with BuildSketch(Plane.XY):
        with Locations((174.498, 0)):
            Circle(SKETCH1_2_OUTSIDE_R)
    # profile 3 of 7: a face of its own
    with BuildSketch(Plane.XY):
        with Locations((151.11970091, 87.249)):
            Circle(SKETCH1_2_OUTSIDE_R)
    # profile 4 of 7: a face of its own
    with BuildSketch(Plane.XY):
        with Locations((151.11970091, -87.249)):
            Circle(SKETCH1_2_OUTSIDE_R)
    # profile 5 of 7: a face of its own
    with BuildSketch(Plane.XY):
        with Locations((98.986703653, 57.15)):
            Circle(SKETCH1_2_OUTSIDE_R_2)
    # profile 6 of 7: a face of its own
    with BuildSketch(Plane.XY):
        with Locations((114.3, 0)):
            Circle(SKETCH1_2_OUTSIDE_R_2)
    # profile 7 of 7: a face of its own
    with BuildSketch(Plane.XY):
        with Locations((98.986703653, -57.15)):
            Circle(SKETCH1_2_OUTSIDE_R_2)
    extrude(amount=CUT_EXTRUDE3_DEPTH, mode=Mode.SUBTRACT)

    # Fillet2
    fillet2_edges = [body_2.edges().sort_by_distance(p)[0] for p in [
        (155.394709042, -104.381873933, 7.62),
        (80.948066989, -61.400085104, 7.401809581),
        (80.948066989, 61.400085104, 7.401809581),
        (155.394709042, 104.381873933, 7.62),
    ]]
    fillet(fillet2_edges, radius=FILLET2_R)

    # Sketch2<2> → Cut-Extrude4 (cut, two sides: drawn at the far end of the back side and taken through both)
    with BuildSketch(Plane.XY.offset(2.54).offset(-CUT_EXTRUDE4_DEPTH_BACK)):
        with Locations((137.698969318, 43.474878375)):
            Circle(SKETCH2_2_R)
        with Locations((137.698969318, -43.474878375)):
            Circle(SKETCH2_2_R)
    extrude(amount=CUT_EXTRUDE4_DEPTH + CUT_EXTRUDE4_DEPTH_BACK, mode=Mode.SUBTRACT)


solid = Compound([part.part, body_2.part])
